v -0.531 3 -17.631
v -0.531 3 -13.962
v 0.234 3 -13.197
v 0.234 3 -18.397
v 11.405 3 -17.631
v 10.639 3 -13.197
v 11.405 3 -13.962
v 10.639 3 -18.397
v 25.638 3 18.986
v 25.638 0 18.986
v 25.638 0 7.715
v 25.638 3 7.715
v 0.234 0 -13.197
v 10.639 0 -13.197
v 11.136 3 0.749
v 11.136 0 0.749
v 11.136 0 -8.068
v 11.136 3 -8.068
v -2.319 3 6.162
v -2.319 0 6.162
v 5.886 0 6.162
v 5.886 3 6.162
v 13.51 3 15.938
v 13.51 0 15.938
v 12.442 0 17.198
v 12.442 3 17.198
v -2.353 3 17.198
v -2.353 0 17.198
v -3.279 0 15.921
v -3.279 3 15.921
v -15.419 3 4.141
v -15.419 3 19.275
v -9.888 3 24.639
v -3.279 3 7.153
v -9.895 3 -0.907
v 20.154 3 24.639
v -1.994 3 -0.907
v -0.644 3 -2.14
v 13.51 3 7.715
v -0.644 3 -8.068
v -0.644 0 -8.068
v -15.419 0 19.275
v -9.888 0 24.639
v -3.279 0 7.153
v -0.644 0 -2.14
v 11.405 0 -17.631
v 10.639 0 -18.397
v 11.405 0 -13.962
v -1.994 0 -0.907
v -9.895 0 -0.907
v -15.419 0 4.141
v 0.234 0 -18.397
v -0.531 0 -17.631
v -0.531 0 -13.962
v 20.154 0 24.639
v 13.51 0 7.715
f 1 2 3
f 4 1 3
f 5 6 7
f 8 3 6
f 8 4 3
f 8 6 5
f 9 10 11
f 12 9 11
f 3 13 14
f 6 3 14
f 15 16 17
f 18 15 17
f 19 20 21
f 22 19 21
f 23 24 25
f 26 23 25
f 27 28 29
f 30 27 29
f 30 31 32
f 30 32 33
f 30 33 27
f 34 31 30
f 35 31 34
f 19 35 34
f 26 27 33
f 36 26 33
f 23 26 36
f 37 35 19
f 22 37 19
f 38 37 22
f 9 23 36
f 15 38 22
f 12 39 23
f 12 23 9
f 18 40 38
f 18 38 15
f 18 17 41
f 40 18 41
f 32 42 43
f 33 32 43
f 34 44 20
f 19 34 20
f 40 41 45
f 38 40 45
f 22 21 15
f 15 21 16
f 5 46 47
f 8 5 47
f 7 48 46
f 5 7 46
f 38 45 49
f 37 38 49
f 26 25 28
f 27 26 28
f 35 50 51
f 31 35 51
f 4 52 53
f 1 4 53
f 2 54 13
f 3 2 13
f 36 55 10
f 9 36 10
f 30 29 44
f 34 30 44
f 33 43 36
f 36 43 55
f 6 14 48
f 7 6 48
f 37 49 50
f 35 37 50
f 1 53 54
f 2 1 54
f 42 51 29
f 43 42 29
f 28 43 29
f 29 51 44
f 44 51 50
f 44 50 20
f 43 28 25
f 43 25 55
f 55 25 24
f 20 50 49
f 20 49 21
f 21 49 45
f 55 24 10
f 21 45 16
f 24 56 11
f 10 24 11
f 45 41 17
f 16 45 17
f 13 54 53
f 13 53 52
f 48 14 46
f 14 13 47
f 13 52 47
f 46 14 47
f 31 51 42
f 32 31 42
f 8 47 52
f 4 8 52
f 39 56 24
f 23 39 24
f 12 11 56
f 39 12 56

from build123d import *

# Parameters (mm, degrees)
EXTRUDE_1_DEPTH   = 3
EXTRUDE_1_2_DEPTH = 3


with BuildPart() as part:
    # 草图1 → 凸台-拉伸1 (new body)
    with BuildSketch(Plane(origin=(0, 0, 0), x_dir=(1, 0, 0), z_dir=(0, 1, 0))):
        Polygon((25.637552557, -18.985620439), (25.637552557, -7.714616343), (13.5104667, -7.714616343), (13.5104667, -15.937756848), (12.441882902, -17.197566631), (-2.35330466, -17.197566631), (-3.27912841, -15.920718967), (-3.27912841, -7.152500555), (-2.318531745, -6.162085626), (5.886014423, -6.162085626), (11.135743374, -0.749397742), (11.135743374, 8.068150789), (-0.644307785, 8.068150789), (-0.644307785, 2.140146906), (-1.994016853, 0.90675288), (-9.894977458, 0.90675288), (-15.418775569, -4.141016123), (-15.418775569, -19.274774033), (-9.888098832, -24.638939565), (20.154437012, -24.638939565), align=None)
    extrude(amount=EXTRUDE_1_DEPTH)


with BuildPart() as body_2:
    # 草图1 → Extrude 1 2 (new body)
    with BuildSketch(Plane(origin=(0, 0, 0), x_dir=(1, 0, 0), z_dir=(0, 1, 0))):
        Polygon((10.639393218, 13.196544402), (11.405078643, 13.962229827), (11.405078643, 17.630858977), (10.639393218, 18.396544402), (0.234355973, 18.396544402), (-0.531329452, 17.630858977), (-0.531329452, 13.962229827), (0.234355973, 13.196544402), align=None)
    extrude(amount=EXTRUDE_1_2_DEPTH)


solid = Compound([part.part, body_2.part])
